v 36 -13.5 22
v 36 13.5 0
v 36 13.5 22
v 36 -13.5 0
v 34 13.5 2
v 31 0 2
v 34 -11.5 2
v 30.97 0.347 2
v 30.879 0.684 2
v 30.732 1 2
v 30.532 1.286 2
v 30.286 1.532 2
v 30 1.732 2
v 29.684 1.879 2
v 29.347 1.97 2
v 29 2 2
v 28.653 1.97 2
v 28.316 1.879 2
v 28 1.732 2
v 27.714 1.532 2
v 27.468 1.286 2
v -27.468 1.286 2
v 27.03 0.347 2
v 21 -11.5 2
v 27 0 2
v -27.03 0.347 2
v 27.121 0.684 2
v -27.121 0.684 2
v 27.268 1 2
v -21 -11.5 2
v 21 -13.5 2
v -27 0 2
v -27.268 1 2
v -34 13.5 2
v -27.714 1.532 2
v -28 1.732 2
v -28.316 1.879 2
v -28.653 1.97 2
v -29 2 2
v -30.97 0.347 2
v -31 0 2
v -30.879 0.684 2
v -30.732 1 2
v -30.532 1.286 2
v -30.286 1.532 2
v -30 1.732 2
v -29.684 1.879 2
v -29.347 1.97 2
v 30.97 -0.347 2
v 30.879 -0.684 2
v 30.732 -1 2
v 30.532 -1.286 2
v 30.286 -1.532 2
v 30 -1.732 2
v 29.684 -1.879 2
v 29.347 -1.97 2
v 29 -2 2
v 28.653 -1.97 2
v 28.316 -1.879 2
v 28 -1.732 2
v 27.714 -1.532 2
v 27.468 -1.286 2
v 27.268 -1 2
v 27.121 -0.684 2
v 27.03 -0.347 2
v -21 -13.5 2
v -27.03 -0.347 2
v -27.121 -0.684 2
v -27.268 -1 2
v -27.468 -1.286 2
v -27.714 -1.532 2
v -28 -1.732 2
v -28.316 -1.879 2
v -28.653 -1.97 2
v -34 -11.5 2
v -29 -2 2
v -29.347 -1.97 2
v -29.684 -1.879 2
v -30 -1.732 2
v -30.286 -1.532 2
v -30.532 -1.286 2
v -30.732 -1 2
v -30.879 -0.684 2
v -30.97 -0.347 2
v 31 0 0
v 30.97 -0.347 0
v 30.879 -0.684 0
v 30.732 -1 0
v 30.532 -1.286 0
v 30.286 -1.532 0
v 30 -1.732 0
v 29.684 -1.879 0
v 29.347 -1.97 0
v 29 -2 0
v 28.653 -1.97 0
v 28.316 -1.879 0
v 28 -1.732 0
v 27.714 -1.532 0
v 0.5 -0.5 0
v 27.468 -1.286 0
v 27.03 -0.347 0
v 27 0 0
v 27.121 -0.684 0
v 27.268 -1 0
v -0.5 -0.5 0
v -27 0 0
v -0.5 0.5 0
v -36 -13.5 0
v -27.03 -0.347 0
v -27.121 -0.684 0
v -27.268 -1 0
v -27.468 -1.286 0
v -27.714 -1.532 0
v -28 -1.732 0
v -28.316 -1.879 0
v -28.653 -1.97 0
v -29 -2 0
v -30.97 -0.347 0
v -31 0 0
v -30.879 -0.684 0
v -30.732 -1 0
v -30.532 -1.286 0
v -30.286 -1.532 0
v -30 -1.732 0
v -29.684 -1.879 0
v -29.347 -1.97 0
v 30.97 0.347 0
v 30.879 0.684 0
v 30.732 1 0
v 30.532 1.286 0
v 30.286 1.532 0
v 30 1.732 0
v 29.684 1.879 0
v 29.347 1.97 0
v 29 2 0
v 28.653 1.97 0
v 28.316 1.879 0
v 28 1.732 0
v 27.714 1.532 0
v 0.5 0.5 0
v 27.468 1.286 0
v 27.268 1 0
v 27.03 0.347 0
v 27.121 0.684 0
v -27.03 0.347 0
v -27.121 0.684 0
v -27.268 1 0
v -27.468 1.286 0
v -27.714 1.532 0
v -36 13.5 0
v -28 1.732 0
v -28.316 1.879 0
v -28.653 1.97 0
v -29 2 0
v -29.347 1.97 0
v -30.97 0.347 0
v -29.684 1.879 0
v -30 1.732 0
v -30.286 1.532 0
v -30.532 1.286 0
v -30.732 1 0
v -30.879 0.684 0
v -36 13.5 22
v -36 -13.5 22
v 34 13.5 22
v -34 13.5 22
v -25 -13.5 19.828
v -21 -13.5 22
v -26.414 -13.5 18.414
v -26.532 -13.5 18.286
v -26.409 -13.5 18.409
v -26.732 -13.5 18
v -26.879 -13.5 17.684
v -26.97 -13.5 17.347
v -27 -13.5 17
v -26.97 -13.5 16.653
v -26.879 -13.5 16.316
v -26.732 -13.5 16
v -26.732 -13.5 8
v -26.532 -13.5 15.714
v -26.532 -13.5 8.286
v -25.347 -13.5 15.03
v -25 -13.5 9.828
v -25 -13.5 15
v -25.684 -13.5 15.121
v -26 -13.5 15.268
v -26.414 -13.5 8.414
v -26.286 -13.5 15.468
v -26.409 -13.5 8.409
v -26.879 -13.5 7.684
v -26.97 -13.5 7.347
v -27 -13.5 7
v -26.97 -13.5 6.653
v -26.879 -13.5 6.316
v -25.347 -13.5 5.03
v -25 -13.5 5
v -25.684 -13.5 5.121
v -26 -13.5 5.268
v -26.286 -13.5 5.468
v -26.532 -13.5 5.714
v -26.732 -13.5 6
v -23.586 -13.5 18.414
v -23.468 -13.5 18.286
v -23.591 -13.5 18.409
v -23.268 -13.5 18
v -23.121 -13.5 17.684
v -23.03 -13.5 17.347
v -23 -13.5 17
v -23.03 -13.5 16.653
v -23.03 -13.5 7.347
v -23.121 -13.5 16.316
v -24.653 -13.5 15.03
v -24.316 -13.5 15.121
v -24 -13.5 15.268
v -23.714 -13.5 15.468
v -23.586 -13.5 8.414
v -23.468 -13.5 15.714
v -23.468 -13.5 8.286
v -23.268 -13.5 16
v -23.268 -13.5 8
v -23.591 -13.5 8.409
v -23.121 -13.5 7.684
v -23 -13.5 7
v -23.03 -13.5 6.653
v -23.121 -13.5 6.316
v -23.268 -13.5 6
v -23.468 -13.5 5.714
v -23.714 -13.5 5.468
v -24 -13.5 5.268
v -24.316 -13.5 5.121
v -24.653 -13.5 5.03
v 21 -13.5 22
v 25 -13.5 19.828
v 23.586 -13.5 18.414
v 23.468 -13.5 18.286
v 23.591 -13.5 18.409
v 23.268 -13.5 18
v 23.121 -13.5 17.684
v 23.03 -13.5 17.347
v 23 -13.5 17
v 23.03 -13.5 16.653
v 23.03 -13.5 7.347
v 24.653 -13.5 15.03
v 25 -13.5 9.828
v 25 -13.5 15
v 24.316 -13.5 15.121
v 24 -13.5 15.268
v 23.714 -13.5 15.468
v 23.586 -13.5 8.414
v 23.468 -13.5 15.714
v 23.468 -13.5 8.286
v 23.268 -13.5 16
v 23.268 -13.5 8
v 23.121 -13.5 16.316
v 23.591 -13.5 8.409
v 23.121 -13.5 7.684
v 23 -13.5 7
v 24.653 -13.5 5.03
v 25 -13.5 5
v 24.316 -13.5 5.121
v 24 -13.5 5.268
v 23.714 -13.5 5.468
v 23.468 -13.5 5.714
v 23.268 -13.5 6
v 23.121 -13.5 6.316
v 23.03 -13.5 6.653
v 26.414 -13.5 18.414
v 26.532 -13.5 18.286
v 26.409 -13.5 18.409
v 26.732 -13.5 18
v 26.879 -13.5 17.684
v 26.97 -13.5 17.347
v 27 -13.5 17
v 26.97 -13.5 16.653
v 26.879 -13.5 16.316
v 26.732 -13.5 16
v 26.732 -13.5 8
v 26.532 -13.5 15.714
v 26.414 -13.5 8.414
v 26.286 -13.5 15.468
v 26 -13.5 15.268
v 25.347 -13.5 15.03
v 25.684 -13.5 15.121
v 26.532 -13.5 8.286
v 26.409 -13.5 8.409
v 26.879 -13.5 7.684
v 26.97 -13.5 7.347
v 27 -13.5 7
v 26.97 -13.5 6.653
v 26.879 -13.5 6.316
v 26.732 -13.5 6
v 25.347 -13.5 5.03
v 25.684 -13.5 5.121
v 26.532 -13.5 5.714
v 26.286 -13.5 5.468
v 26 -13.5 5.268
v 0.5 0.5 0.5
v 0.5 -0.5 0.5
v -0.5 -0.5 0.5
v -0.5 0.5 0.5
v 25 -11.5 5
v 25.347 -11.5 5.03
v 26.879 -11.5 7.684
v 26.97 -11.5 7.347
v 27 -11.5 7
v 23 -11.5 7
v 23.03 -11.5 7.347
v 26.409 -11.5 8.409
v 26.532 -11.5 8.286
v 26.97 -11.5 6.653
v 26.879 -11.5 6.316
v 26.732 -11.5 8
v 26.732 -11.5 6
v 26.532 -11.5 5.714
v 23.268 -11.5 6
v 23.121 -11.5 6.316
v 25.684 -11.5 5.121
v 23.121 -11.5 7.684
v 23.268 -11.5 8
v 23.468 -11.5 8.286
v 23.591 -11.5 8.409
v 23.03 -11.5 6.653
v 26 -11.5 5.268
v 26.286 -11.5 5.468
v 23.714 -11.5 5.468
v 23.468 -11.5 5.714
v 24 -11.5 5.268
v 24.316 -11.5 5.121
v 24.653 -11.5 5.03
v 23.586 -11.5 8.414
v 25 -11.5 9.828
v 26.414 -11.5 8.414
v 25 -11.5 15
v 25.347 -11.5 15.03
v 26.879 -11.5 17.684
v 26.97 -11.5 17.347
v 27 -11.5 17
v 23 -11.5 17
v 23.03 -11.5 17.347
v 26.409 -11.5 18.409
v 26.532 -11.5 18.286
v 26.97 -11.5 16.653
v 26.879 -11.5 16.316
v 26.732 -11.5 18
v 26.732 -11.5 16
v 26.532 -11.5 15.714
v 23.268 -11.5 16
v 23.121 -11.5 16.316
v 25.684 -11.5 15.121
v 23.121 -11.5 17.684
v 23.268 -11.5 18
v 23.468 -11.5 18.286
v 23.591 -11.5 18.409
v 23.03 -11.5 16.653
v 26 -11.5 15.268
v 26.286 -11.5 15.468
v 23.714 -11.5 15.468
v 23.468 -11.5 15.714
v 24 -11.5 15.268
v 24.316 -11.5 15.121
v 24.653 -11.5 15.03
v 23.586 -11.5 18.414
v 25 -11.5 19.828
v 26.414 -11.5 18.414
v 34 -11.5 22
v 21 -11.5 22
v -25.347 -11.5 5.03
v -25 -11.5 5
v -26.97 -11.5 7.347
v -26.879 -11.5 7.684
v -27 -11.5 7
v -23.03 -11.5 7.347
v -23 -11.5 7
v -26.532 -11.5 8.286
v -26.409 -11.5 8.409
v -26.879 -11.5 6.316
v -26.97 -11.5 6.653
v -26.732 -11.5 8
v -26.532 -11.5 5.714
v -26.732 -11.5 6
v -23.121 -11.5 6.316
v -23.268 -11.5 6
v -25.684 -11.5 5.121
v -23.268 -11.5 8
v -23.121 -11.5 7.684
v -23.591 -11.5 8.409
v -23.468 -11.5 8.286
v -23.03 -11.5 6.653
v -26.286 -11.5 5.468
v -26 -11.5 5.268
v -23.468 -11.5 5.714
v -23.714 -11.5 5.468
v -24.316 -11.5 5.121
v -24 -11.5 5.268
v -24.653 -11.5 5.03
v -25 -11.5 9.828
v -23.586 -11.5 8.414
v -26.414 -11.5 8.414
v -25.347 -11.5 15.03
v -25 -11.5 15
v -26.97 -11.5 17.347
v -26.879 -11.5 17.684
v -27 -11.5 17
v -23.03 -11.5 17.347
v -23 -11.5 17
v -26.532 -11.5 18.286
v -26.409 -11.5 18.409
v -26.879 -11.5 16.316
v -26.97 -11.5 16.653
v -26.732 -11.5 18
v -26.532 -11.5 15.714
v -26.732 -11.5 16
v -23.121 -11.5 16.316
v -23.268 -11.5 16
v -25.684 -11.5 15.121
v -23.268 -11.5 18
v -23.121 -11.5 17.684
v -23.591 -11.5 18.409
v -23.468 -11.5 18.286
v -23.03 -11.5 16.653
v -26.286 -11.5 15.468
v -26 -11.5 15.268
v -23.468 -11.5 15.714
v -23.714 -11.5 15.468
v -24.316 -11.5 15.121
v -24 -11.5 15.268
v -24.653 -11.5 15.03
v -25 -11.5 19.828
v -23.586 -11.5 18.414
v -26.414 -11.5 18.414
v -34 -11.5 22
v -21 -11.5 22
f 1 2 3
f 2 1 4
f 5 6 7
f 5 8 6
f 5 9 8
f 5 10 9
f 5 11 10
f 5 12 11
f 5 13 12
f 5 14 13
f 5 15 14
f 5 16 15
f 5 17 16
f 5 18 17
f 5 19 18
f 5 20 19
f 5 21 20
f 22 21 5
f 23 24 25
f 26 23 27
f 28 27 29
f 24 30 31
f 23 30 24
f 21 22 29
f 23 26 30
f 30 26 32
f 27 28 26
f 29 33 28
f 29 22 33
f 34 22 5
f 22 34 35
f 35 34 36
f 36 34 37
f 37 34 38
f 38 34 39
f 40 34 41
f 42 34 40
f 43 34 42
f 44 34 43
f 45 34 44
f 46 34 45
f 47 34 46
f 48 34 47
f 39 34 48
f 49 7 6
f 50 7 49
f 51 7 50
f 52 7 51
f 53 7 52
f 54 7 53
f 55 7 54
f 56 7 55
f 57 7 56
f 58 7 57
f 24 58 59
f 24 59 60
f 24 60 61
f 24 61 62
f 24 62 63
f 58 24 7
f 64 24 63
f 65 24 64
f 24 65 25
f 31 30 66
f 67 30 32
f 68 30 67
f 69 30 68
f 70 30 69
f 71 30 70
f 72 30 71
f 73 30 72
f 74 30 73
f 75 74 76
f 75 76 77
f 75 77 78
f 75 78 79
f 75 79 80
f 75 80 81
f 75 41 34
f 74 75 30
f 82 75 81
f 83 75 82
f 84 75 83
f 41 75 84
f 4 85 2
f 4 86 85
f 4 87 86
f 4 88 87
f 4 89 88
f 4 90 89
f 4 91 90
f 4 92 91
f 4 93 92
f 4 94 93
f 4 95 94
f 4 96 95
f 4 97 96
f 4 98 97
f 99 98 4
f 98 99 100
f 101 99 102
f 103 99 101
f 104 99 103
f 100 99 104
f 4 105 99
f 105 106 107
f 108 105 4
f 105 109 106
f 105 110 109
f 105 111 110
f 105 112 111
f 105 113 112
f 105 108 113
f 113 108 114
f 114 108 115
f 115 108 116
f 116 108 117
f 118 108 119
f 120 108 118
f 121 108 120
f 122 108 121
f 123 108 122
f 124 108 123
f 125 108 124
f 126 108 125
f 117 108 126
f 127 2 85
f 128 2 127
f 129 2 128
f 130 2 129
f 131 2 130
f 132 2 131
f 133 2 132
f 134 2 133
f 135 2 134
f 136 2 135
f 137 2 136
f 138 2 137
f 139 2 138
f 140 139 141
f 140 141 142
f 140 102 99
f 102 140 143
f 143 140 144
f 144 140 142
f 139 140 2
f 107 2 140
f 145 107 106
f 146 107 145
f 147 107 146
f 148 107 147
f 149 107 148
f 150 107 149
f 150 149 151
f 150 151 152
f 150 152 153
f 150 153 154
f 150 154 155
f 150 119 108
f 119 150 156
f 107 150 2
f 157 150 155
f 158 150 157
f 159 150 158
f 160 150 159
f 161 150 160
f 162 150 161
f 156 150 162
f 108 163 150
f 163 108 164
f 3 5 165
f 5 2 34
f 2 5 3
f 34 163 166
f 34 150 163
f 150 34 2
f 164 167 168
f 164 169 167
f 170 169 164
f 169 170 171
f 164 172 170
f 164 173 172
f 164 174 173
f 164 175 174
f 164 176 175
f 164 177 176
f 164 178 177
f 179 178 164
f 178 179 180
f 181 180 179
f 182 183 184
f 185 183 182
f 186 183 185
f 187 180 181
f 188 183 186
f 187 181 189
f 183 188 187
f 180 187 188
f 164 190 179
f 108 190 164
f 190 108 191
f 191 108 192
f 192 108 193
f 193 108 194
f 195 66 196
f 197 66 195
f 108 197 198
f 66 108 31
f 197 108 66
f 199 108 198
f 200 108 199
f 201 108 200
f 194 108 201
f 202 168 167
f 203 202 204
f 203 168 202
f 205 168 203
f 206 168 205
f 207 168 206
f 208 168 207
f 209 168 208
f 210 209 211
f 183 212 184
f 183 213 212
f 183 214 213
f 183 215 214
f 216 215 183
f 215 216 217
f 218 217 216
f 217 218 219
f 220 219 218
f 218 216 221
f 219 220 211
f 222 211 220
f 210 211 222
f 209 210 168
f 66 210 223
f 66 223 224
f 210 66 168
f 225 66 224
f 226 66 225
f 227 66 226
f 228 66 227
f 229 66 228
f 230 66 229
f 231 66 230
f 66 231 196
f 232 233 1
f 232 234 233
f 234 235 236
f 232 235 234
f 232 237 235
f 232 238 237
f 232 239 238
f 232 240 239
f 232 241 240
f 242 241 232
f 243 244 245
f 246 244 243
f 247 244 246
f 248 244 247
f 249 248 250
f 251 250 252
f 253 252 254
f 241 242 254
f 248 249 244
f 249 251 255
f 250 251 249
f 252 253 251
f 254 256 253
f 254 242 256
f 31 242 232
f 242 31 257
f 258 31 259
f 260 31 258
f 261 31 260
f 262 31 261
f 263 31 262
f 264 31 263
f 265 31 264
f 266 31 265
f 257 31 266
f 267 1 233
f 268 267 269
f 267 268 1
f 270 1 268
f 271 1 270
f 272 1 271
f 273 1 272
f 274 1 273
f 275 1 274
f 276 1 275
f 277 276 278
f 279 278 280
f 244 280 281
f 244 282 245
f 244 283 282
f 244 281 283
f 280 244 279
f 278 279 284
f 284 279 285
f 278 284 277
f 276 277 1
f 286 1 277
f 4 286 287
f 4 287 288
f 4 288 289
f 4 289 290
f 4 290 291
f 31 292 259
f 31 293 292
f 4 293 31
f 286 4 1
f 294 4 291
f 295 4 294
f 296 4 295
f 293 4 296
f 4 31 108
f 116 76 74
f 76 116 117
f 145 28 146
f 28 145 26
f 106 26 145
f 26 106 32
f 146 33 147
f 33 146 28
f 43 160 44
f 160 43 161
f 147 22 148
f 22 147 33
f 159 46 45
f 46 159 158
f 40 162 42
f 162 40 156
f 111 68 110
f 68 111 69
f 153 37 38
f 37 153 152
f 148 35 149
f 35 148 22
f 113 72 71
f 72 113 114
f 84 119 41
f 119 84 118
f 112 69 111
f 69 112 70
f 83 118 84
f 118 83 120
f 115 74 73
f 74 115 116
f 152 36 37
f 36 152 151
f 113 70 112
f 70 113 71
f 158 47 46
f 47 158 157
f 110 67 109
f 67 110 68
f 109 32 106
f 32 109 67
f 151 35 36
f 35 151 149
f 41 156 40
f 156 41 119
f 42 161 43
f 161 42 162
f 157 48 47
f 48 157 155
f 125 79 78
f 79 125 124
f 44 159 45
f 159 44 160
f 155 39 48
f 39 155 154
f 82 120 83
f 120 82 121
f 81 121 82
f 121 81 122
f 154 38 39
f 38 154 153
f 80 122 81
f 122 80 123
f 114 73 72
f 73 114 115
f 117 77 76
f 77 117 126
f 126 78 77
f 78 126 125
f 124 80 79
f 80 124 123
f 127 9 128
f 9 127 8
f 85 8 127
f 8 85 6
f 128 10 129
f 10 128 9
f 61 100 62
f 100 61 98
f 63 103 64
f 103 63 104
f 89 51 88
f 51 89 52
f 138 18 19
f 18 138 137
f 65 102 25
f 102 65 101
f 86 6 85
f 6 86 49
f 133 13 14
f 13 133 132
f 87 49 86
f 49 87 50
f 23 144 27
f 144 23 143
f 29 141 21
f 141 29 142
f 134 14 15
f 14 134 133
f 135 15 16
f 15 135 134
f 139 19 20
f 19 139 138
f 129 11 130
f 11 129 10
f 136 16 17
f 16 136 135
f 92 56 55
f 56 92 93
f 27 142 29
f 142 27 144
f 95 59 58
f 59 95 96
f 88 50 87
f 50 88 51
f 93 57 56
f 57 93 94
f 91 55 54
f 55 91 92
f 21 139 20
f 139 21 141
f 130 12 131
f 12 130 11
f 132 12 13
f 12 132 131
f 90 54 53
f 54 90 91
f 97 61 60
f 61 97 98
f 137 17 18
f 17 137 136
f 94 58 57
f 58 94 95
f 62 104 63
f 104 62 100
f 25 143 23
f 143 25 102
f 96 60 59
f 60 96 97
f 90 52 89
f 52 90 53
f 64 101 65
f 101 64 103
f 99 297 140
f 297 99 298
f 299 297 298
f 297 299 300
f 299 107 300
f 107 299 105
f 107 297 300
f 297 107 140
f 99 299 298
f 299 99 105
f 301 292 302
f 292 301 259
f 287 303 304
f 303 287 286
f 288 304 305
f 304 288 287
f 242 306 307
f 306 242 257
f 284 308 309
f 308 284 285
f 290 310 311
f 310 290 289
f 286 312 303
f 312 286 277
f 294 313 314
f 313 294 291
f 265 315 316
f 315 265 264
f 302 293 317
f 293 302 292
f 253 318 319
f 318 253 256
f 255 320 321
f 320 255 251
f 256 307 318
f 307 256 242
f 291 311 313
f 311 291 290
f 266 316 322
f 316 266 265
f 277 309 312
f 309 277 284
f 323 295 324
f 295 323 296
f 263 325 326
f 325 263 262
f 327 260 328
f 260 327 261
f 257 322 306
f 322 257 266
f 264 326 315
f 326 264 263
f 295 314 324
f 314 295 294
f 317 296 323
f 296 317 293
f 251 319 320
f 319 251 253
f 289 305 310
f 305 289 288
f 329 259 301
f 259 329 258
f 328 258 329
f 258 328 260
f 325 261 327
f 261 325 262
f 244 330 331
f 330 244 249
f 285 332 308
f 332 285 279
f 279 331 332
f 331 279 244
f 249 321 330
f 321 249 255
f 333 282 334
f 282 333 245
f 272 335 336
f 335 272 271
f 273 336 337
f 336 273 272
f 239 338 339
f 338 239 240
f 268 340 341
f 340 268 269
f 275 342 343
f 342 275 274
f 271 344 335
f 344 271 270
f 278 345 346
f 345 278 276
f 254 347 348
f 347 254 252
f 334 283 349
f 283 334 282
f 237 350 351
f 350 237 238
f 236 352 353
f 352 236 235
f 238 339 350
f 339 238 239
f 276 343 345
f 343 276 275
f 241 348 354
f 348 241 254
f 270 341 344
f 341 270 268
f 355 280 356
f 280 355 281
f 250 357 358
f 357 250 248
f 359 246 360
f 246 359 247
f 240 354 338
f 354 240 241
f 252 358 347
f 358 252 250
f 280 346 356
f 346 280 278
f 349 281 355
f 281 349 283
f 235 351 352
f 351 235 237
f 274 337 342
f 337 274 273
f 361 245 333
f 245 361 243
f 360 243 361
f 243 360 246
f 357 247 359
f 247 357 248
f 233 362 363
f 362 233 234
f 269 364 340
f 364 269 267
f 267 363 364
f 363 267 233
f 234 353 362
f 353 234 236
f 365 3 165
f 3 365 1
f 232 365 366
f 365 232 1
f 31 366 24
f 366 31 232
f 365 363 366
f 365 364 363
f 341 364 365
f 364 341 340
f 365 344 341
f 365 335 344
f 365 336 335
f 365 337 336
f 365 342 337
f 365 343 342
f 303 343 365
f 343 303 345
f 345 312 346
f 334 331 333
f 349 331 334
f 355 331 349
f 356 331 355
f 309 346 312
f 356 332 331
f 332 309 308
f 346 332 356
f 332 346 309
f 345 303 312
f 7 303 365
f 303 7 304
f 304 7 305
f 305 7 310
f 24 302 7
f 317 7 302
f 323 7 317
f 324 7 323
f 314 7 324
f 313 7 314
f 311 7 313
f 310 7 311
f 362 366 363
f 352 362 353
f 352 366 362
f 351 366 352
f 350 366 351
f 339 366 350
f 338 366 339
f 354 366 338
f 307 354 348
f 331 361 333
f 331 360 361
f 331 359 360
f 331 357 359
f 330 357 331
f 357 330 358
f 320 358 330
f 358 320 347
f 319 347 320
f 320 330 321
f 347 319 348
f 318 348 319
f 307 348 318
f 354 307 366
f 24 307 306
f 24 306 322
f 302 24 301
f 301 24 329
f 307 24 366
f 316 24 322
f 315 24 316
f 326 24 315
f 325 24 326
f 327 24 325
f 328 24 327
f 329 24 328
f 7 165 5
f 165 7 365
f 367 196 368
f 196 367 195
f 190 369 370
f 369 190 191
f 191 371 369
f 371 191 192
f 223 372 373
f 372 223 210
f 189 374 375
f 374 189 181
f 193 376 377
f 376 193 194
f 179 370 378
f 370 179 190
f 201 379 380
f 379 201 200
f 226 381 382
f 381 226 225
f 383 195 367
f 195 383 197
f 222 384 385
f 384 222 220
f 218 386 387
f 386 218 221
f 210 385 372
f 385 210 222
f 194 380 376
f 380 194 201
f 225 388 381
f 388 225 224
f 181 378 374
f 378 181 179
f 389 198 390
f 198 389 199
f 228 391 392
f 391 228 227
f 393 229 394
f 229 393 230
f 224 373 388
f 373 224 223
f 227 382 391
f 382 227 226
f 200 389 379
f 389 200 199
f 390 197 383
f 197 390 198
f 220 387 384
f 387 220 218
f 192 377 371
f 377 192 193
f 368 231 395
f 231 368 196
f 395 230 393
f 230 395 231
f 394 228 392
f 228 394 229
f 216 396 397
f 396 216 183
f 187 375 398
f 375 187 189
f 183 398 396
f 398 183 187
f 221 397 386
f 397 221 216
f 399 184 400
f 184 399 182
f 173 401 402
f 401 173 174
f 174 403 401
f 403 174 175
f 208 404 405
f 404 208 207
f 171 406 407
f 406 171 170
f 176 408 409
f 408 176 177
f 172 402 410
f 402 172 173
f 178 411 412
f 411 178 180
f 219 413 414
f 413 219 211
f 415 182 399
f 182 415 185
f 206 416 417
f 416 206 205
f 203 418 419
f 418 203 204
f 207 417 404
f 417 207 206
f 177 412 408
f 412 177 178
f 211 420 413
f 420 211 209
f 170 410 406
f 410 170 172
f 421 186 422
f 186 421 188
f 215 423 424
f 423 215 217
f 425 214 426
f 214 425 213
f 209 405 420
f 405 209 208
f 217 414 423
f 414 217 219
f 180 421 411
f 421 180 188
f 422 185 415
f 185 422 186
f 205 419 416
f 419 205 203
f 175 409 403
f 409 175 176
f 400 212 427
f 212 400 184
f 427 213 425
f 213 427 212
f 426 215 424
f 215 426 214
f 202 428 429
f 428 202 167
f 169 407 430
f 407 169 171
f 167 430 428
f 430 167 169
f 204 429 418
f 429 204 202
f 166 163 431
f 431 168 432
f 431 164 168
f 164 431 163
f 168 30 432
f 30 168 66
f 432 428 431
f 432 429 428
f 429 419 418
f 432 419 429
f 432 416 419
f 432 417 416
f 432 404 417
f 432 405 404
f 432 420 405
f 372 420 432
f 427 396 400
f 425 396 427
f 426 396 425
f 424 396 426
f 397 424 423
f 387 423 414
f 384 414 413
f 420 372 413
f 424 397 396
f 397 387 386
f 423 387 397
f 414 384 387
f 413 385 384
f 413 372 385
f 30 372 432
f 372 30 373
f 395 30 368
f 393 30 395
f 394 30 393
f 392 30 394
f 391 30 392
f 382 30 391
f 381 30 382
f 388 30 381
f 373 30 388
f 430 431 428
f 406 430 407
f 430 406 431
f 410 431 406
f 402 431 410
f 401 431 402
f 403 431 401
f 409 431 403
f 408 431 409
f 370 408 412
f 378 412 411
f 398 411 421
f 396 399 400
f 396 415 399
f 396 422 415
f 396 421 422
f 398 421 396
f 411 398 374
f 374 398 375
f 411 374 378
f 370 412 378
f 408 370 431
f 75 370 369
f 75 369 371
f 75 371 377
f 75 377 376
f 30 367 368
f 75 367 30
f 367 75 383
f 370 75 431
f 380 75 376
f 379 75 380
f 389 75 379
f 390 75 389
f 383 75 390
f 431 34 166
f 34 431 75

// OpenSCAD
// file: lib.scad
$fn=36;


module true_hole (d=1, L=10)
{
	union() {
		rotate(a=90, v=[1,0,0])
		cylinder(center=true, r=d/2, h=L);

		translate([0,0,d/2*sqrt(2)/2])
		rotate(a=45, v=[0,1,0])
		rotate(a=90, v=[1,0,0])
		cube(center=true, size=[d/2, d/2, L]);

	}
}

module tricube(w=1, h=1, l=1)
{
	translate([0, w, 0]) rotate(a=90, v=[1,0,0])
	linear_extrude(height=w) {
		polygon(points=[[0,0], [0,h], [l,0]]);
	}
}


module arc(h=1, r1=1, r2=2, a=90)
{
	difference() {
		cylinder(r=r2, h=h);
		union() {
				cylinder(r=r1, h=h);
				translate([0,-r2,0]) mirror([1,0,0]) cube(size=[r2,r2*2,h]);
				rotate(a=90-a, v=[0,0,1]) translate([-r2,0,0]) mirror([0,1,0]) cube(size=[r2*2,r2,h]);
		}
	}

}


module subarc(r=1, h=1)
{
	translate([r,r,0])
	rotate(a=180, v=[0,0,1])
	difference() {
		cube(size=[r,r,h]);
		cylinder(r=r, h=h);
	}
}
// main file
include <lib.scad>;

thikness = 2;

servo_width = 42;
servo_height = 20;
servo_length = 27;
servo_hole_d = 4;
servo_hole_h1 = 5;
servo_hole_h2 = 15;
servo_hole_margin = 4;

mount_margin_w = 15;
mount_hole_d = 4;
mount_hole_margin = 8;

difference() {
	translate([-servo_width/2 - mount_margin_w, -servo_length/2, 0])
		cube(size=[servo_width + mount_margin_w*2, servo_length, thikness]);

	translate([-servo_width/2 - mount_hole_margin, 0, -1])
	cylinder(r=mount_hole_d/2, h=thikness*4);

	translate([servo_width/2 + mount_hole_margin, 0, -1])
	cylinder(r=mount_hole_d/2, h=thikness*4);

	cube(center=true, esize=[]);
}

module serv_mount()
{
	translate([mount_margin_w-thikness, -servo_length/2+thikness, 0])
	rotate(a=0, v=[0,0,1])
	cube(size=[thikness, servo_length-thikness, servo_height]);

	translate([0, -servo_length/2, 0])
	difference() {
		cube(size=[mount_margin_w, thikness, servo_height]);
		translate([servo_hole_margin, thikness, servo_hole_h1])
		true_hole(d=servo_hole_d, L=thikness*4);

		translate([servo_hole_margin, thikness, servo_hole_h2])
		true_hole(d=servo_hole_d, L=thikness*4);
	}
}

translate([servo_width/2, 0, thikness]) serv_mount();
translate([-servo_width/2, 0, thikness]) mirror([1,0,0]) serv_mount();
